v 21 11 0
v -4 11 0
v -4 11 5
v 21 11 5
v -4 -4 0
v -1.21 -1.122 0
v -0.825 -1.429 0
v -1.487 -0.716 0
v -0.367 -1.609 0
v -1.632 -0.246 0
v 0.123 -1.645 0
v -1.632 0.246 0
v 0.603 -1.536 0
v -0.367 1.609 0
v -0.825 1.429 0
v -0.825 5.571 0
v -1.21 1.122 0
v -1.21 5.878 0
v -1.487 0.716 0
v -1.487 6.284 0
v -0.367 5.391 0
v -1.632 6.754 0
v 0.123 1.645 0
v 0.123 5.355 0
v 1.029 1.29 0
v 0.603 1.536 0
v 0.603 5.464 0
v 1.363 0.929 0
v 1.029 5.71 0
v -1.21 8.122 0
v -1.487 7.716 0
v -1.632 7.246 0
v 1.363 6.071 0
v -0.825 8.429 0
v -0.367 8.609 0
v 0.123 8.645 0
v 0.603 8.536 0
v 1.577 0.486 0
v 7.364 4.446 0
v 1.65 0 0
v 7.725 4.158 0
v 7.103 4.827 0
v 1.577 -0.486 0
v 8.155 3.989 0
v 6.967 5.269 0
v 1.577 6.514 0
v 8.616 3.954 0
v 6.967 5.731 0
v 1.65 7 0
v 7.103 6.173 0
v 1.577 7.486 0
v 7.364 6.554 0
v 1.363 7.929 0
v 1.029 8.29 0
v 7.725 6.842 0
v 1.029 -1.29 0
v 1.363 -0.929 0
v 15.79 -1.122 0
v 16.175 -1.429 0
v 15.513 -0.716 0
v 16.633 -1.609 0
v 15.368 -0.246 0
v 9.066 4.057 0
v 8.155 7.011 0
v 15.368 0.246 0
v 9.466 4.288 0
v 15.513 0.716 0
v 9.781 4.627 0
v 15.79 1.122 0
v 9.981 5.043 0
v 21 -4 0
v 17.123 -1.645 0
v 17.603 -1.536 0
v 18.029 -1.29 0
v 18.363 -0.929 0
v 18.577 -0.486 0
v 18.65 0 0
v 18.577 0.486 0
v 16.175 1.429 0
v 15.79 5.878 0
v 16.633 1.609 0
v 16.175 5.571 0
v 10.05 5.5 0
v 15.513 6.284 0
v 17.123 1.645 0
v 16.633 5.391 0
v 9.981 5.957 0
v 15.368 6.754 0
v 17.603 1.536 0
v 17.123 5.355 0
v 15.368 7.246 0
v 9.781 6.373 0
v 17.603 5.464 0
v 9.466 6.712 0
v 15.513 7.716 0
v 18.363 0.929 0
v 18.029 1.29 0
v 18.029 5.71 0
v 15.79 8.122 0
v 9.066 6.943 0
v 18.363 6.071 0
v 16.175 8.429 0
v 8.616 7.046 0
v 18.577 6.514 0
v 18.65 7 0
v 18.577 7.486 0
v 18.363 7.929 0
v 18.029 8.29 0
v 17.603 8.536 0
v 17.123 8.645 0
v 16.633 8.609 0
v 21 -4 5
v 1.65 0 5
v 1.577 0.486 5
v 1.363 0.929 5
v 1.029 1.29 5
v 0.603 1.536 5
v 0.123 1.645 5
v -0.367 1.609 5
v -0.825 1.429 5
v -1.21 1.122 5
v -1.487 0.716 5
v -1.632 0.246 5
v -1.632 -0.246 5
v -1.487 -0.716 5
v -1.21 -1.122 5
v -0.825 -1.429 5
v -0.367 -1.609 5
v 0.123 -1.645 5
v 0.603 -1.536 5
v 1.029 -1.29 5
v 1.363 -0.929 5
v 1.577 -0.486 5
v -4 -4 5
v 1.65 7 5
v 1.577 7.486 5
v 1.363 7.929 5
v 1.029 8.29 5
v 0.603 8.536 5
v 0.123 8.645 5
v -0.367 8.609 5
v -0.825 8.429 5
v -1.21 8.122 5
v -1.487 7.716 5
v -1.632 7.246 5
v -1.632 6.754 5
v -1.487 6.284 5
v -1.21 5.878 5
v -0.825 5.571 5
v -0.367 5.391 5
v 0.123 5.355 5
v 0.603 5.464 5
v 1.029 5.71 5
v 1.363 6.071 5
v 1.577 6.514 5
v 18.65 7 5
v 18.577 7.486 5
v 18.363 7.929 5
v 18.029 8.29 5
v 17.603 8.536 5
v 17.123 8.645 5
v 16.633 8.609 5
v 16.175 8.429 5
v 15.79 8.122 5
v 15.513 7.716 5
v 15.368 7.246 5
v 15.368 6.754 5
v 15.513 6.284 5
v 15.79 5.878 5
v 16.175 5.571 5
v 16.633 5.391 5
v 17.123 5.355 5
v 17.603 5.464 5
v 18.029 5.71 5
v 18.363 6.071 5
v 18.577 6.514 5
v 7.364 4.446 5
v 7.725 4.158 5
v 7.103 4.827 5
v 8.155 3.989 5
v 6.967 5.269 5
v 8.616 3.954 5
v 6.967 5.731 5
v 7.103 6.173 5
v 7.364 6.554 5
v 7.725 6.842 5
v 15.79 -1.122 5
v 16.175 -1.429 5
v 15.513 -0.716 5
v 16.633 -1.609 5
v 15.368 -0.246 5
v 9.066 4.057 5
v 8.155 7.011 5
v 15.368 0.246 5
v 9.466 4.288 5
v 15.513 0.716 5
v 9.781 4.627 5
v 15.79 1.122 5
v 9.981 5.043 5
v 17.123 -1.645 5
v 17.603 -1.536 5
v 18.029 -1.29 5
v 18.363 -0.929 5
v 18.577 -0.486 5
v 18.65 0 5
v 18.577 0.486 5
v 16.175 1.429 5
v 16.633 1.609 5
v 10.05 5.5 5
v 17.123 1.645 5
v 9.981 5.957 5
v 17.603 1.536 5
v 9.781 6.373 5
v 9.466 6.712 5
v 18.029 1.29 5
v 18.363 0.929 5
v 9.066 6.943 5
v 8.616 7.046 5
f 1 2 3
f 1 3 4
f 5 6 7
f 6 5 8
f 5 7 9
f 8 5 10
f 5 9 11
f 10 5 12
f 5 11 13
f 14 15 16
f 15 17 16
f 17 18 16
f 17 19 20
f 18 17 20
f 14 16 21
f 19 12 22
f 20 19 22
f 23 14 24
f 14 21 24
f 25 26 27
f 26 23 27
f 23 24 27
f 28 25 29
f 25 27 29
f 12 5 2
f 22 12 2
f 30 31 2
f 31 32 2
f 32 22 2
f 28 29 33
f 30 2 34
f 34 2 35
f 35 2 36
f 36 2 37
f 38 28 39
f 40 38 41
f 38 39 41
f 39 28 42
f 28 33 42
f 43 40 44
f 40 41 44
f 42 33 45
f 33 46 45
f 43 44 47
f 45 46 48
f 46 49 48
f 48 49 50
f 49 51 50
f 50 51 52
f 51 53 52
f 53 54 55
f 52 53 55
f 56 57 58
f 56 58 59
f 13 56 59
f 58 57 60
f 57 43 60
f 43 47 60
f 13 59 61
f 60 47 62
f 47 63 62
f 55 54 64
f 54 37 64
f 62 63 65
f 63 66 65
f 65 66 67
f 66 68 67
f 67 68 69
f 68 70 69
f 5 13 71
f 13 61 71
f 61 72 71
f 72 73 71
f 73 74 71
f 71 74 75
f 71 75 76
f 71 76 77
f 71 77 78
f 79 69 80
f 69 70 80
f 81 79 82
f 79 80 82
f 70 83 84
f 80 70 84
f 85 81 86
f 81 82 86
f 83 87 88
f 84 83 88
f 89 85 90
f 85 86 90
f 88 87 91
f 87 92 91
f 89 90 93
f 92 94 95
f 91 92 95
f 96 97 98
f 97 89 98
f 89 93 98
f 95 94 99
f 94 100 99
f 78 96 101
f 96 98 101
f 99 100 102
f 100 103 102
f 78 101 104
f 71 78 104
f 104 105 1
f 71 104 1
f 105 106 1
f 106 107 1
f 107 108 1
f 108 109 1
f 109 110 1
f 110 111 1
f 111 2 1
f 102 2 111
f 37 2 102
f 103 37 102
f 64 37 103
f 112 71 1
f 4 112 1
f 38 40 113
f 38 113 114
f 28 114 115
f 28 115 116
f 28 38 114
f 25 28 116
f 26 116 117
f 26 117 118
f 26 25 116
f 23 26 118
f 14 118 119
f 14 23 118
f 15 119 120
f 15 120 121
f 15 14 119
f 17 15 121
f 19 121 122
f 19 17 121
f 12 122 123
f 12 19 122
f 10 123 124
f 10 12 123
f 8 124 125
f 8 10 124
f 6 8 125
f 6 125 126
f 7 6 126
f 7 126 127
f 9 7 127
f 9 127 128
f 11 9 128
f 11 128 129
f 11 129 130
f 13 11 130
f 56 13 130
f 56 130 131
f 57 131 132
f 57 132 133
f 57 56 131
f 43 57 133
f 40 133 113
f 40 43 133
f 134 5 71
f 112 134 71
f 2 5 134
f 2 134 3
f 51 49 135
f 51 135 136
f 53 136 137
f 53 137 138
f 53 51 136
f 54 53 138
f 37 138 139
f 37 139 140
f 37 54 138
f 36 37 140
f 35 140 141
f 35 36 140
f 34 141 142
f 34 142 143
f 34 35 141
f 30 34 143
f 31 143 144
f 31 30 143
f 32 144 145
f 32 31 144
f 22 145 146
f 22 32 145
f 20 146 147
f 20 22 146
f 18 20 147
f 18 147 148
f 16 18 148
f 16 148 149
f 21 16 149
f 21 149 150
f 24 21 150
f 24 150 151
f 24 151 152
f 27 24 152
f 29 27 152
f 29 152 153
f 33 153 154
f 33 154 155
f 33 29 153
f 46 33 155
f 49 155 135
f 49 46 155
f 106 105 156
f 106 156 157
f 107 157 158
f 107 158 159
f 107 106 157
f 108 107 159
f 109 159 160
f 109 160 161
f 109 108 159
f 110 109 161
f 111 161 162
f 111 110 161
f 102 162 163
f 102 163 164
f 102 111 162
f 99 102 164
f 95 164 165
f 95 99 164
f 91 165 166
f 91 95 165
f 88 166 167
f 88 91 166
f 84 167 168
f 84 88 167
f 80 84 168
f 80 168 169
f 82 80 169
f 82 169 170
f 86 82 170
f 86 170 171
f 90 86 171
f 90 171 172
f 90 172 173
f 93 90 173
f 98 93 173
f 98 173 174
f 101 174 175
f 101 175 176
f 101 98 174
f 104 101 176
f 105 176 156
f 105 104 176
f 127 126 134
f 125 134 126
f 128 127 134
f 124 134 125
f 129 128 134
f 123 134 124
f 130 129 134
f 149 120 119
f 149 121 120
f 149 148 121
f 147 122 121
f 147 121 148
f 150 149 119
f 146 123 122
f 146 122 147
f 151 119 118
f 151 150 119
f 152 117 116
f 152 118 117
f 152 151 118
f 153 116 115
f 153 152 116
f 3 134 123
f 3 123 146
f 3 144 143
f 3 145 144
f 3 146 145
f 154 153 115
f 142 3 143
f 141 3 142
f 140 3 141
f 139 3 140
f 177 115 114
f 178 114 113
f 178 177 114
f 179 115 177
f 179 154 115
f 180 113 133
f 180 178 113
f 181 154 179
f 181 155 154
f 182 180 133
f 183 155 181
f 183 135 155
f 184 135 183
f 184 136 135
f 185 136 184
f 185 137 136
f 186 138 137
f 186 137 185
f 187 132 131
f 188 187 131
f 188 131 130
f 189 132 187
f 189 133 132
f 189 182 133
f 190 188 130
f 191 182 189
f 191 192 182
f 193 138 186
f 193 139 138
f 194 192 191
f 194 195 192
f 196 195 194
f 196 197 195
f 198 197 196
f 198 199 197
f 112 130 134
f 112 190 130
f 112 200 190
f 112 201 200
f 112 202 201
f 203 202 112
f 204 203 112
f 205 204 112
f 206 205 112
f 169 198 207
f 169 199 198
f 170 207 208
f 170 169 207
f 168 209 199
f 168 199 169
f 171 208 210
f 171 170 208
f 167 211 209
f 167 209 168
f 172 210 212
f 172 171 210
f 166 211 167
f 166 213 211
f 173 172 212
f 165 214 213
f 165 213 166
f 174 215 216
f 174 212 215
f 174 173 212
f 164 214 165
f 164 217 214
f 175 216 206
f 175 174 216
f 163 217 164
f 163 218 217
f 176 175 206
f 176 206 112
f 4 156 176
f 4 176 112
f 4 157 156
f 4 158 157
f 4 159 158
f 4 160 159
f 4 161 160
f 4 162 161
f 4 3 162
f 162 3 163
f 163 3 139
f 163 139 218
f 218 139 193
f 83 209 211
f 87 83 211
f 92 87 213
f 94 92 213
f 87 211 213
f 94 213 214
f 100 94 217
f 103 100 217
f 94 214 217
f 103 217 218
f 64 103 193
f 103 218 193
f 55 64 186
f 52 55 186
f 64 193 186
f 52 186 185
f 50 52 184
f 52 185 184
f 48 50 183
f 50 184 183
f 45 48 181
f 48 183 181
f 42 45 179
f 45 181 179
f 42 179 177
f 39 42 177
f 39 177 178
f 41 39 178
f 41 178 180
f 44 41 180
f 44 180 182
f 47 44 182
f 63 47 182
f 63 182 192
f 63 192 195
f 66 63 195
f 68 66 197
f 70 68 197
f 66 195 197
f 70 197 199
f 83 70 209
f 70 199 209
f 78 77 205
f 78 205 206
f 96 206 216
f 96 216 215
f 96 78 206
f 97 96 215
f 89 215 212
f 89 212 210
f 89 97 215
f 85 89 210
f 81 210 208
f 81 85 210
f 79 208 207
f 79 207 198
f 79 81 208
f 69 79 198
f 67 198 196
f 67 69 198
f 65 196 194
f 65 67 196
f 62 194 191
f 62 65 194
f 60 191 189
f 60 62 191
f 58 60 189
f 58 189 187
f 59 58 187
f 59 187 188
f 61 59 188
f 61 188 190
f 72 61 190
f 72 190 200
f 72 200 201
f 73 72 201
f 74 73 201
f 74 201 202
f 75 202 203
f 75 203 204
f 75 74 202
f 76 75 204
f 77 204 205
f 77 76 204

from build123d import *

# Parameters (mm, degrees)
SZKIC1_W                    = 25
SZKIC1_H                    = 15
SZKIC1_R                    = 1.65
DODANIE_WYCI_GNI_CIE1_DEPTH = 5
SZKIC2_R                    = 1.55
WYTNIJ_WYCI_GNI_CIE1_DEPTH  = 5


with BuildPart() as part:
    # Szkic1 → Dodanie-wyciągnięcie1 (new body)
    with BuildSketch(Plane.XY):
        with Locations((8.5, 3.5)):
            Rectangle(SZKIC1_W, SZKIC1_H)
        Circle(SZKIC1_R, mode=Mode.SUBTRACT)
        with Locations((0, 7)):
            Circle(SZKIC1_R, mode=Mode.SUBTRACT)
        with Locations((17, 0)):
            Circle(SZKIC1_R, mode=Mode.SUBTRACT)
        with Locations((17, 7)):
            Circle(SZKIC1_R, mode=Mode.SUBTRACT)
    extrude(amount=DODANIE_WYCI_GNI_CIE1_DEPTH)

    # Szkic2 → Wytnij-wyciągnięcie1 (cut)
    with BuildSketch(Plane.XY.offset(5)):
        with Locations((8.5, 5.5)):
            Circle(SZKIC2_R)
    extrude(amount=-WYTNIJ_WYCI_GNI_CIE1_DEPTH, mode=Mode.SUBTRACT)


solid = part.part
